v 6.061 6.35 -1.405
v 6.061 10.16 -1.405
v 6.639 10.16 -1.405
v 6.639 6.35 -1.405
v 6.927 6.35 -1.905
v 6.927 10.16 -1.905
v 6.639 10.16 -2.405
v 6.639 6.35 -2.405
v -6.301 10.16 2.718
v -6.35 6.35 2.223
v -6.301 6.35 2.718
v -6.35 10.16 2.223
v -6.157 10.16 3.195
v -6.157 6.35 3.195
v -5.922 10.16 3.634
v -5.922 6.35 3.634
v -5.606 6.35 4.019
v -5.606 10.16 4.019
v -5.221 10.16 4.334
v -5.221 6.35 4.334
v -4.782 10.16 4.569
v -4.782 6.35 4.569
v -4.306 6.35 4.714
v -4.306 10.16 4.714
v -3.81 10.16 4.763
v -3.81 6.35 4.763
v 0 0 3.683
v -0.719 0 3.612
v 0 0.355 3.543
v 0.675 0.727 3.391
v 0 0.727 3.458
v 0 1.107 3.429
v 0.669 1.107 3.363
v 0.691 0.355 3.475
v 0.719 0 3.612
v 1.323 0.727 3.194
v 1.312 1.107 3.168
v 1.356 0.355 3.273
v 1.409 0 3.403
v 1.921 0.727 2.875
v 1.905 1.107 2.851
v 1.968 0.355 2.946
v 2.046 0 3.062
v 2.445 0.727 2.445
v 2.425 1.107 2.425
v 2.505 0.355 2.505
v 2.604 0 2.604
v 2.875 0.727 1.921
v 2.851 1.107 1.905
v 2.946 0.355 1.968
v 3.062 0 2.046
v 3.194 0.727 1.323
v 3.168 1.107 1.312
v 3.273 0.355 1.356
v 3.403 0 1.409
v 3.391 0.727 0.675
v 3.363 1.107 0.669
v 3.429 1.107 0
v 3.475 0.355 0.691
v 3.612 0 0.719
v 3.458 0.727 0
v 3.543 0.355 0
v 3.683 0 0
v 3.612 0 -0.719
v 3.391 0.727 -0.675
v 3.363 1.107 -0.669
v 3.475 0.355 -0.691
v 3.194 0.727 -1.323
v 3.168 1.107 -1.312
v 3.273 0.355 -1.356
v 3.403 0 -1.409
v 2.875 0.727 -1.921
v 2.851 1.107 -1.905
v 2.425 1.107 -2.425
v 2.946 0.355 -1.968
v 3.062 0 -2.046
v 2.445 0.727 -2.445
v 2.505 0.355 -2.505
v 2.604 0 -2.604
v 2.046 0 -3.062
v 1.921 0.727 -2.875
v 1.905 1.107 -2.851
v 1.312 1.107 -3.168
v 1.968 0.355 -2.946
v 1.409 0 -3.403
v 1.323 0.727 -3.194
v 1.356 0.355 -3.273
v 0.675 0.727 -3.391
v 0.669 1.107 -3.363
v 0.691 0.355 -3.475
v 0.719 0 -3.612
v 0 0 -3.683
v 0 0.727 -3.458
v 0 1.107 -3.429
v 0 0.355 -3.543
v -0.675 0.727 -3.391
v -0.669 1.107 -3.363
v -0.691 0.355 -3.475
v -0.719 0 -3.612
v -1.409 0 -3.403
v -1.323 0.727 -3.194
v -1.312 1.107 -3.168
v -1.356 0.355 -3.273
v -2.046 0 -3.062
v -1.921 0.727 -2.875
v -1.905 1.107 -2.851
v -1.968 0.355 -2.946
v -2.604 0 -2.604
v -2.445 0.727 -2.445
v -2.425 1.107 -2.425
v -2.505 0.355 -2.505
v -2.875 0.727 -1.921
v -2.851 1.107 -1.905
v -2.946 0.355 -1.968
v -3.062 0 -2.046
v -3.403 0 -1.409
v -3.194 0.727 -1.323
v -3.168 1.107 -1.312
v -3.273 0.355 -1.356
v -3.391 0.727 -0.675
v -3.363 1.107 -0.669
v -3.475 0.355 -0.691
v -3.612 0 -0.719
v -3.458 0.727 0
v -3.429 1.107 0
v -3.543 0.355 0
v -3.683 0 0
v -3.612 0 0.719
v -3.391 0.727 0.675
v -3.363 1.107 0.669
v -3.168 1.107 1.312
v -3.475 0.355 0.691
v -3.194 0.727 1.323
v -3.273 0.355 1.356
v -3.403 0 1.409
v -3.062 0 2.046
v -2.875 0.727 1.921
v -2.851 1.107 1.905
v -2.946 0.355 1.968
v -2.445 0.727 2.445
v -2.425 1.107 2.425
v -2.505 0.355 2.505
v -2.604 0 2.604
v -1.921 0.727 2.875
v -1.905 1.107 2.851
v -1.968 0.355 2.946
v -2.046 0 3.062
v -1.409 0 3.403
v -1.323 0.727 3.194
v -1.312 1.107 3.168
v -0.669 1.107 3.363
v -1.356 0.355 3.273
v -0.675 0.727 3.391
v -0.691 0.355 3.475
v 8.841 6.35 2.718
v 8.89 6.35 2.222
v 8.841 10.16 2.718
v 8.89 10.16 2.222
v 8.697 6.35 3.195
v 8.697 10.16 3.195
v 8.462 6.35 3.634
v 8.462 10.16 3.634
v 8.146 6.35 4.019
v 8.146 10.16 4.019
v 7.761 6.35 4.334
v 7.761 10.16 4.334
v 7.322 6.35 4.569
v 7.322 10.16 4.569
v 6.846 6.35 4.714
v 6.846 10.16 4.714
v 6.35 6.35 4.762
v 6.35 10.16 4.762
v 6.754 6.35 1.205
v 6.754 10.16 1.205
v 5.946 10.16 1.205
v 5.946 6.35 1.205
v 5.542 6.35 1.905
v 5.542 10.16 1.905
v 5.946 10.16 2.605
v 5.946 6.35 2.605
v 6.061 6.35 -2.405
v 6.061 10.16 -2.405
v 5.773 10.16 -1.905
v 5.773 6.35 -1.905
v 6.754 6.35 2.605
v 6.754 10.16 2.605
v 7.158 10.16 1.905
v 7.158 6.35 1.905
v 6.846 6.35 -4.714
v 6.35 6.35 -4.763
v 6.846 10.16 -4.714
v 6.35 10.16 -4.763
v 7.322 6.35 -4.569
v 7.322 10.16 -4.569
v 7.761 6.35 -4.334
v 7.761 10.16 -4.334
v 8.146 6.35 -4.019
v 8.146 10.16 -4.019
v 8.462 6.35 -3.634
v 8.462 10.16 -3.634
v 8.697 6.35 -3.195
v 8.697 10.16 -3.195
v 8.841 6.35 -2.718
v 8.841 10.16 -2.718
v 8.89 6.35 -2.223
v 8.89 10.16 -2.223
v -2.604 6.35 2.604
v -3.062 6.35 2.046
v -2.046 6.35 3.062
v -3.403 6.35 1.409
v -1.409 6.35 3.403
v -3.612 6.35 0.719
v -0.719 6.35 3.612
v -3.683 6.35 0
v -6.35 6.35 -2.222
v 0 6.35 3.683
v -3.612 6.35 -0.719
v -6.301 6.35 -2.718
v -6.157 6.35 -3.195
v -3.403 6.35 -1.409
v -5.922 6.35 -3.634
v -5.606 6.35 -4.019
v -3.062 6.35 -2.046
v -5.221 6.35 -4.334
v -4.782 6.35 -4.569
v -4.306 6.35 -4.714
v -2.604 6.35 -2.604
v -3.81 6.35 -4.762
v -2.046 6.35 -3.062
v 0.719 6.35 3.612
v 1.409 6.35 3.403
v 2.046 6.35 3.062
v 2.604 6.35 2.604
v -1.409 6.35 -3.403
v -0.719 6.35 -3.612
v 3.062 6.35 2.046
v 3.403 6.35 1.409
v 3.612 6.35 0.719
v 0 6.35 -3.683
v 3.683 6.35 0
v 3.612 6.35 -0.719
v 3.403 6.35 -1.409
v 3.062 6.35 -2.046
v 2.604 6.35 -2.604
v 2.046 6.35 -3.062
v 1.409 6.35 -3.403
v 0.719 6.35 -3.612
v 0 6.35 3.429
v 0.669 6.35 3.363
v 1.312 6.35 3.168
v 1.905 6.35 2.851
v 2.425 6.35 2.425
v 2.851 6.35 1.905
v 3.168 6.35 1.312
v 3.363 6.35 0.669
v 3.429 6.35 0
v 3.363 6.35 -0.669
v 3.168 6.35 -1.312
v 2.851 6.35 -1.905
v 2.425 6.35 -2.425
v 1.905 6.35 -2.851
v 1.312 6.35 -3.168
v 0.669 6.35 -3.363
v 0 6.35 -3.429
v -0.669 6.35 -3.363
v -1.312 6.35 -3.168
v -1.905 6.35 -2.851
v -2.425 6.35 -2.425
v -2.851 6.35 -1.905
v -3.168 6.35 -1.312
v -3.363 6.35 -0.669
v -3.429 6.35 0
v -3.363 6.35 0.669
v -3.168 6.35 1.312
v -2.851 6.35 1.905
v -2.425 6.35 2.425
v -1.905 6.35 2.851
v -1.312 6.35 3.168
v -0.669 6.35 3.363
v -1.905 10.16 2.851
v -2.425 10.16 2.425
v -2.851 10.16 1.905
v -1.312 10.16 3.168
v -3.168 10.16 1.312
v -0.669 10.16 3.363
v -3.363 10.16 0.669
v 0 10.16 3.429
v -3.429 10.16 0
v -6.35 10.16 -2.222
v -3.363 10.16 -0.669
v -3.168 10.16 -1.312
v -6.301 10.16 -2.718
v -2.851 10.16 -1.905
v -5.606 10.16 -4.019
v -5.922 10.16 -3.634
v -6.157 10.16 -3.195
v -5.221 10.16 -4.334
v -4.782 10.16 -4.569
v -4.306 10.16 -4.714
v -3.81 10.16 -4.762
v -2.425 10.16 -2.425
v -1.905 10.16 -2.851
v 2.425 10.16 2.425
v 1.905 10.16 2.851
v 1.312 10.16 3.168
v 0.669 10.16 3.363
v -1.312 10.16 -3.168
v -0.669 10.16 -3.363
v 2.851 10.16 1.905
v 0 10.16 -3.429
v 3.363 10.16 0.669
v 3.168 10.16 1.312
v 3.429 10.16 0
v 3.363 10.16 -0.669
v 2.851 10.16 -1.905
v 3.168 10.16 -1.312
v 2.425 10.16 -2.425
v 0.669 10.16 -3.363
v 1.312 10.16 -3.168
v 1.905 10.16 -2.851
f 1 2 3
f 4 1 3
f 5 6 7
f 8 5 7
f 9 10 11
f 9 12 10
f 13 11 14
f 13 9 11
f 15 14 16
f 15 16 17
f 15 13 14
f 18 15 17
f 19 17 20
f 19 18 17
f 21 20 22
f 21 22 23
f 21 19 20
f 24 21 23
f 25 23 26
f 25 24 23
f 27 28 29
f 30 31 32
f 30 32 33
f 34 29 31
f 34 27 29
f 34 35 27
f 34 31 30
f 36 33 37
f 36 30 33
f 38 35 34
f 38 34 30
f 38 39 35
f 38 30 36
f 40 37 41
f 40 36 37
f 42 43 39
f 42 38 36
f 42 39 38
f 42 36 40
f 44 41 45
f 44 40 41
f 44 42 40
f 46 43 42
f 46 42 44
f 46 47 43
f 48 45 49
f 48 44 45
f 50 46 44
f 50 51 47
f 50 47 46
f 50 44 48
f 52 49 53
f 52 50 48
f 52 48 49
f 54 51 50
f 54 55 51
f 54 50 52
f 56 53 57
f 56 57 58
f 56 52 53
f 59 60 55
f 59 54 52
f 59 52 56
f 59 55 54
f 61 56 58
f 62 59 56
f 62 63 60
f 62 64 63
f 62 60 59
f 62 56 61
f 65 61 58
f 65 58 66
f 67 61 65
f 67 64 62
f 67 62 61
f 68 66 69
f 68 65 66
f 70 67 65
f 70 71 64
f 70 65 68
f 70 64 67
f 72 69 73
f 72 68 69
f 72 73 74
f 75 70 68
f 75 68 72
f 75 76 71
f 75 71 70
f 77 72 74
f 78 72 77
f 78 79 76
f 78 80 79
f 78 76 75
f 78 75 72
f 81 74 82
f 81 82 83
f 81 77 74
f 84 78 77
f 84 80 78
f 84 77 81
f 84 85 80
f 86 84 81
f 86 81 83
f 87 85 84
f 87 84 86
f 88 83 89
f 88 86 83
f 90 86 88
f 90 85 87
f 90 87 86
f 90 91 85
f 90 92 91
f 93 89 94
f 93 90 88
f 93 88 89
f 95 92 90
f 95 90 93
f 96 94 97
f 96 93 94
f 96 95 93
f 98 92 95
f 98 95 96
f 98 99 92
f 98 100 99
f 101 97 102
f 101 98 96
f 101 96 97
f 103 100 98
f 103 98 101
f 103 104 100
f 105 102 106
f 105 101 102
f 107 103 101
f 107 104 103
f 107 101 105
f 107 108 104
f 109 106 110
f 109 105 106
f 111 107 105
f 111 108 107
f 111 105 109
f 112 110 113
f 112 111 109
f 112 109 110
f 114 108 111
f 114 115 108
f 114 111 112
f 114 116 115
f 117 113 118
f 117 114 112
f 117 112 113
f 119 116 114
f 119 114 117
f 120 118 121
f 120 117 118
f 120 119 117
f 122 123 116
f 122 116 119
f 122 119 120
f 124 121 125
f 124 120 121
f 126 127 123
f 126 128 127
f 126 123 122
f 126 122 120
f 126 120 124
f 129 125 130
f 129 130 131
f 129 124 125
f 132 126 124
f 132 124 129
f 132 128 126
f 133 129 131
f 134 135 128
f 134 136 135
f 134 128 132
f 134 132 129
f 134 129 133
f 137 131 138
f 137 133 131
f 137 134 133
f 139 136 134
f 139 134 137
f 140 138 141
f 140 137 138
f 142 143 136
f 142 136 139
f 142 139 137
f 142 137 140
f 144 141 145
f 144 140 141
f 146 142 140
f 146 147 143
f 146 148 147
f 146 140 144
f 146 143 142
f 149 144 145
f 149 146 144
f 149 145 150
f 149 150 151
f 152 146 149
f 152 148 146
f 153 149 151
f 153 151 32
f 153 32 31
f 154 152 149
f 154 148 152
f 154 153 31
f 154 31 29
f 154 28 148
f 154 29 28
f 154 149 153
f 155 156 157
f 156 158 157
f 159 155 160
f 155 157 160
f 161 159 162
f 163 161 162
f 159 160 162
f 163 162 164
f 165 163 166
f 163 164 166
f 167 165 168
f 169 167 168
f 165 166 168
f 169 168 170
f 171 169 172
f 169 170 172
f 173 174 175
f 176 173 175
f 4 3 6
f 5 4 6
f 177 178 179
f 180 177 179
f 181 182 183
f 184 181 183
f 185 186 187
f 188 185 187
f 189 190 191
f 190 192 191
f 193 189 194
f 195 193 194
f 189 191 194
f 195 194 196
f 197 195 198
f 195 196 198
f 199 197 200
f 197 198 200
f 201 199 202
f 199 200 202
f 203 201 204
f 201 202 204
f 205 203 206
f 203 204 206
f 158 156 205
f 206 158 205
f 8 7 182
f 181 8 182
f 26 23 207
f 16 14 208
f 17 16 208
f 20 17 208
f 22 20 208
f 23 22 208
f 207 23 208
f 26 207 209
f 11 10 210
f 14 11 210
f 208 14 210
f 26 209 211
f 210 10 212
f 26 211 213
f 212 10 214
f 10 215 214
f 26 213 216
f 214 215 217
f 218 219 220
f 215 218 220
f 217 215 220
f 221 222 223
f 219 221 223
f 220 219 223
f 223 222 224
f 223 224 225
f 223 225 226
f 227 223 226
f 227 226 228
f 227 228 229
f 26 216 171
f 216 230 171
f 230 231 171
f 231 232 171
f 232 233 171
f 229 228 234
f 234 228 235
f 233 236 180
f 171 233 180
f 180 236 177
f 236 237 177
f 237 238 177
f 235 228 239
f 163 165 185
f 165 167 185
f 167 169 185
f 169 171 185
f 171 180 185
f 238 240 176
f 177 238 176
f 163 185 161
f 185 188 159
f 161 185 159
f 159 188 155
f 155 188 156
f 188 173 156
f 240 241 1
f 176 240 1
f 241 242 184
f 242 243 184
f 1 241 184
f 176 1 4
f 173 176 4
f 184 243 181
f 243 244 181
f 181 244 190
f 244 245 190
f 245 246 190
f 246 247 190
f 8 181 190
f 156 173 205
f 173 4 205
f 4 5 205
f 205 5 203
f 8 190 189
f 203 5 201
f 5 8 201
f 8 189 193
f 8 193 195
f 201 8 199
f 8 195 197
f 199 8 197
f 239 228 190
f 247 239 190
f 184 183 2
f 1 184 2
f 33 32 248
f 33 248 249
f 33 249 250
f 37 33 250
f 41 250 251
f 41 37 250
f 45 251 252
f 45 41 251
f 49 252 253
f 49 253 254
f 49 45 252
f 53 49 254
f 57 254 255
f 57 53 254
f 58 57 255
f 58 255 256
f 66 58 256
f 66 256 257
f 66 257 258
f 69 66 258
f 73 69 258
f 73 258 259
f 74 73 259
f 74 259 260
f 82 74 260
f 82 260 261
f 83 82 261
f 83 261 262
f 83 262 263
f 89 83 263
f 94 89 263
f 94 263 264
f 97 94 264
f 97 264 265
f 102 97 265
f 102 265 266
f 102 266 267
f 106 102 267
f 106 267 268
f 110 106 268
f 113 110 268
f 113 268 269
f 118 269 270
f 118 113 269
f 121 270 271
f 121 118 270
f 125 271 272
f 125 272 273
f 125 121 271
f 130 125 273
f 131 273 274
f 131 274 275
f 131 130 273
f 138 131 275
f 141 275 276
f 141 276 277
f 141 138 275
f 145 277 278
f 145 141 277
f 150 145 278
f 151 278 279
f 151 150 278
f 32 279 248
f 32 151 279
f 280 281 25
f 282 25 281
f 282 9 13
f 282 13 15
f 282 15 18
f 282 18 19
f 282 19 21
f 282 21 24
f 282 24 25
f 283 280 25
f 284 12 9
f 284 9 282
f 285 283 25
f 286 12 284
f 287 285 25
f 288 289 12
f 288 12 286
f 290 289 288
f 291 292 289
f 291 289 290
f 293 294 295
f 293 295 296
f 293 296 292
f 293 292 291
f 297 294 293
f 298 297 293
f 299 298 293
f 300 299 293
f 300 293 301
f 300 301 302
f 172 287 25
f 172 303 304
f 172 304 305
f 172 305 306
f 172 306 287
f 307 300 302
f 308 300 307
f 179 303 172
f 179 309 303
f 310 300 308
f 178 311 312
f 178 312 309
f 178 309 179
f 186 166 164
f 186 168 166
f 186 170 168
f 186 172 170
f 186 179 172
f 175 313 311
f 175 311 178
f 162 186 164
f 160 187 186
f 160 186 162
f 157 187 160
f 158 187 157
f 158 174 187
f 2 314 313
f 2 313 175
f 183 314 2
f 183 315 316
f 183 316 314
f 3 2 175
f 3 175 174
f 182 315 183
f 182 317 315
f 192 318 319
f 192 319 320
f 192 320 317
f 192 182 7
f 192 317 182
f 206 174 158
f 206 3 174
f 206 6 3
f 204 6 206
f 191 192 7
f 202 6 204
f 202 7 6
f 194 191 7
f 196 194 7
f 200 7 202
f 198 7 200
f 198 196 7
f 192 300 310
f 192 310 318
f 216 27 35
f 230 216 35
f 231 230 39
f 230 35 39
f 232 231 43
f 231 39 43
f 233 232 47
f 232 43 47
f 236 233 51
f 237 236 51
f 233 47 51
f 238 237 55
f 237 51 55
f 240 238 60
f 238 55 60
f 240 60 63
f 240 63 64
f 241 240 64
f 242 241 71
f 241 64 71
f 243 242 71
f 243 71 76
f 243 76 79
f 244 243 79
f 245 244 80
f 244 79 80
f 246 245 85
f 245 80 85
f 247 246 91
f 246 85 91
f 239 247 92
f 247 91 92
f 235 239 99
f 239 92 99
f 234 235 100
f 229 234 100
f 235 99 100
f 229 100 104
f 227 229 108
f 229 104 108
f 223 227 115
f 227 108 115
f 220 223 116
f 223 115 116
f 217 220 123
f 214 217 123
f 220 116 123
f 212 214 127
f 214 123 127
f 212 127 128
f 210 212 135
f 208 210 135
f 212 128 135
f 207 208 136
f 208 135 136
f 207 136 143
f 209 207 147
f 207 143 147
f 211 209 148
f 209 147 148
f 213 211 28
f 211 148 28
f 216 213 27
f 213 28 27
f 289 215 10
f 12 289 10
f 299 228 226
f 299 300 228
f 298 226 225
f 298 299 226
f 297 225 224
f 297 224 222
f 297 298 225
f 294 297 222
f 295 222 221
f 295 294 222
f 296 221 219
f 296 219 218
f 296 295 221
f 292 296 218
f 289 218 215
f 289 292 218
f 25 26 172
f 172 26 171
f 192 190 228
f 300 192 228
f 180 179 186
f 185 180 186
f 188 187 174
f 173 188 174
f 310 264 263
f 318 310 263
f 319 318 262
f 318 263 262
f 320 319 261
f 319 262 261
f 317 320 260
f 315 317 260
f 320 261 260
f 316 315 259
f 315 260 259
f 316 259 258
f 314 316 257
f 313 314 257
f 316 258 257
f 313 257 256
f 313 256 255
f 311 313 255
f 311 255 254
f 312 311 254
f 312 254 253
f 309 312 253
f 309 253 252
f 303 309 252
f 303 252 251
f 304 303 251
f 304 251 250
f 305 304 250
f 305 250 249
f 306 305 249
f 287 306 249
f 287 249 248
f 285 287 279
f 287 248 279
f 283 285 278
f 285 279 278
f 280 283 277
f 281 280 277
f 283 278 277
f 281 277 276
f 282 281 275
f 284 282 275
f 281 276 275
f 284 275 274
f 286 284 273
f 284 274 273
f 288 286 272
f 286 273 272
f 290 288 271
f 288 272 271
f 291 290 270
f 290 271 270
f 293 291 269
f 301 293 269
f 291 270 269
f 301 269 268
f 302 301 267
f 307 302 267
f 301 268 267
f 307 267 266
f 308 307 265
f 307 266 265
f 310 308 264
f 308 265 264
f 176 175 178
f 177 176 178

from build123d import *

# Parameters (mm, degrees)
SKETCH1_R           = 3.683
SKETCH1_R_2         = 3.4290000000000003
BOSS_EXTRUDE1_DEPTH = 6.35
FILLET1_R           = 2.54
BOSS_EXTRUDE2_DEPTH = 3.8099999999999996
SKETCH3_R           = 3.4290000000000003
CUT_EXTRUDE1_DEPTH  = 12.917885980743574
CUT_EXTRUDE2_DEPTH  = 3.8099999999999996
FILLET2_R           = 2.54


with BuildPart() as part:
    # Sketch1 → Boss-Extrude1 (new body)
    with BuildSketch(Plane(origin=(0, 0, 0), x_dir=(1, 0, 0), z_dir=(0, 1, 0))):
        with Locations(Location((0, 0, 0), (0, 0, 270))):
            Circle(SKETCH1_R)
        with Locations(Location((0, 0, 0), (0, 0, 270))):
            Circle(SKETCH1_R_2, mode=Mode.SUBTRACT)
    extrude(amount=BOSS_EXTRUDE1_DEPTH)

    # Fillet1
    # the kernel refuses this fillet: 2.54 mm, written as the material it takes off along each edge
    with BuildSketch(Plane(origin=(0, 0, 0), x_dir=(-1.8e-16, 0, 1), z_dir=(-1, 0, -1.8e-16))) as fillet1_piece_1:
        with BuildLine():
            CenterArc((5.968999999999999, 1.107160331659332), FILLET1_R, 180, 25.841932763167165)
            Line((3.683, 0), (3.6372799999999996, -0.02214320663318664))
            ThreePointArc((3.6372799999999996, -0.02214320663318664), (3.556, -0.0508), (3.4290000000000003, -0.0508))
            Line((3.4290000000000003, -0.0508), (3.3782, 0))
            Line((3.3782, 0), (3.378199999999999, 1.107160331659332))
            Line((3.378199999999999, 1.107160331659332), (3.4289999999999994, 1.107160331659332))
        make_face()
    revolve(axis=Axis((0, 0, 0), (0, 1, 0)), mode=Mode.SUBTRACT)

    # Sketch2 → Boss-Extrude2 (add)
    with BuildSketch(Plane(origin=(0, 6.35, 0), x_dir=(1, 0, 0), z_dir=(0, 1, 0))):
        Polygon((8.89, 4.762500000000003), (-6.349999999999998, 4.762499999999998), (-6.349999999999998, -4.762500000000002), (8.890000000000002, -4.7624999999999975), align=None)
    extrude(amount=BOSS_EXTRUDE2_DEPTH)

    # Sketch3 → Cut-Extrude1 (cut, through all)
    with BuildSketch(Plane.XZ.offset(-6.35)):
        with Locations(Location((0, 0, 0), (0, 0, 270))):
            Circle(SKETCH3_R)
    extrude(amount=-CUT_EXTRUDE1_DEPTH, mode=Mode.SUBTRACT)

    # Sketch4 → Cut-Extrude2 (cut)
    with BuildSketch(Plane(origin=(0, 10.159999999999998, 0), x_dir=(1, 0, 0), z_dir=(0, 1, 0))):
        Polygon((6.061324865405188, 1.4049999999999996), (6.638675134594815, 1.4049999999999996), (6.927350269189628, 1.9049999999999978), (6.638675134594814, 2.4049999999999994), (6.061324865405189, 2.4049999999999994), (5.772649730810376, 1.9049999999999991), align=None)
        Polygon((7.158290376865474, -1.9049999999999991), (6.754145188432737, -1.2050000000000012), (5.945854811567263, -1.2050000000000012), (5.541709623134526, -1.904999999999999), (5.945854811567265, -2.6049999999999995), (6.754145188432736, -2.6049999999999995), align=None)
    extrude(amount=-CUT_EXTRUDE2_DEPTH, mode=Mode.SUBTRACT)

    # Fillet2
    fillet2_edges = [part.edges().sort_by_distance(p)[0] for p in [
        (-6.349999999999998, 8.254999999999999, -4.762499999999998),
        (-6.349999999999998, 8.254999999999999, 4.762500000000002),
        (8.890000000000002, 8.254999999999999, 4.7624999999999975),
        (8.89, 8.254999999999999, -4.762500000000003),
    ]]
    fillet(fillet2_edges, radius=FILLET2_R)


solid = part.part
